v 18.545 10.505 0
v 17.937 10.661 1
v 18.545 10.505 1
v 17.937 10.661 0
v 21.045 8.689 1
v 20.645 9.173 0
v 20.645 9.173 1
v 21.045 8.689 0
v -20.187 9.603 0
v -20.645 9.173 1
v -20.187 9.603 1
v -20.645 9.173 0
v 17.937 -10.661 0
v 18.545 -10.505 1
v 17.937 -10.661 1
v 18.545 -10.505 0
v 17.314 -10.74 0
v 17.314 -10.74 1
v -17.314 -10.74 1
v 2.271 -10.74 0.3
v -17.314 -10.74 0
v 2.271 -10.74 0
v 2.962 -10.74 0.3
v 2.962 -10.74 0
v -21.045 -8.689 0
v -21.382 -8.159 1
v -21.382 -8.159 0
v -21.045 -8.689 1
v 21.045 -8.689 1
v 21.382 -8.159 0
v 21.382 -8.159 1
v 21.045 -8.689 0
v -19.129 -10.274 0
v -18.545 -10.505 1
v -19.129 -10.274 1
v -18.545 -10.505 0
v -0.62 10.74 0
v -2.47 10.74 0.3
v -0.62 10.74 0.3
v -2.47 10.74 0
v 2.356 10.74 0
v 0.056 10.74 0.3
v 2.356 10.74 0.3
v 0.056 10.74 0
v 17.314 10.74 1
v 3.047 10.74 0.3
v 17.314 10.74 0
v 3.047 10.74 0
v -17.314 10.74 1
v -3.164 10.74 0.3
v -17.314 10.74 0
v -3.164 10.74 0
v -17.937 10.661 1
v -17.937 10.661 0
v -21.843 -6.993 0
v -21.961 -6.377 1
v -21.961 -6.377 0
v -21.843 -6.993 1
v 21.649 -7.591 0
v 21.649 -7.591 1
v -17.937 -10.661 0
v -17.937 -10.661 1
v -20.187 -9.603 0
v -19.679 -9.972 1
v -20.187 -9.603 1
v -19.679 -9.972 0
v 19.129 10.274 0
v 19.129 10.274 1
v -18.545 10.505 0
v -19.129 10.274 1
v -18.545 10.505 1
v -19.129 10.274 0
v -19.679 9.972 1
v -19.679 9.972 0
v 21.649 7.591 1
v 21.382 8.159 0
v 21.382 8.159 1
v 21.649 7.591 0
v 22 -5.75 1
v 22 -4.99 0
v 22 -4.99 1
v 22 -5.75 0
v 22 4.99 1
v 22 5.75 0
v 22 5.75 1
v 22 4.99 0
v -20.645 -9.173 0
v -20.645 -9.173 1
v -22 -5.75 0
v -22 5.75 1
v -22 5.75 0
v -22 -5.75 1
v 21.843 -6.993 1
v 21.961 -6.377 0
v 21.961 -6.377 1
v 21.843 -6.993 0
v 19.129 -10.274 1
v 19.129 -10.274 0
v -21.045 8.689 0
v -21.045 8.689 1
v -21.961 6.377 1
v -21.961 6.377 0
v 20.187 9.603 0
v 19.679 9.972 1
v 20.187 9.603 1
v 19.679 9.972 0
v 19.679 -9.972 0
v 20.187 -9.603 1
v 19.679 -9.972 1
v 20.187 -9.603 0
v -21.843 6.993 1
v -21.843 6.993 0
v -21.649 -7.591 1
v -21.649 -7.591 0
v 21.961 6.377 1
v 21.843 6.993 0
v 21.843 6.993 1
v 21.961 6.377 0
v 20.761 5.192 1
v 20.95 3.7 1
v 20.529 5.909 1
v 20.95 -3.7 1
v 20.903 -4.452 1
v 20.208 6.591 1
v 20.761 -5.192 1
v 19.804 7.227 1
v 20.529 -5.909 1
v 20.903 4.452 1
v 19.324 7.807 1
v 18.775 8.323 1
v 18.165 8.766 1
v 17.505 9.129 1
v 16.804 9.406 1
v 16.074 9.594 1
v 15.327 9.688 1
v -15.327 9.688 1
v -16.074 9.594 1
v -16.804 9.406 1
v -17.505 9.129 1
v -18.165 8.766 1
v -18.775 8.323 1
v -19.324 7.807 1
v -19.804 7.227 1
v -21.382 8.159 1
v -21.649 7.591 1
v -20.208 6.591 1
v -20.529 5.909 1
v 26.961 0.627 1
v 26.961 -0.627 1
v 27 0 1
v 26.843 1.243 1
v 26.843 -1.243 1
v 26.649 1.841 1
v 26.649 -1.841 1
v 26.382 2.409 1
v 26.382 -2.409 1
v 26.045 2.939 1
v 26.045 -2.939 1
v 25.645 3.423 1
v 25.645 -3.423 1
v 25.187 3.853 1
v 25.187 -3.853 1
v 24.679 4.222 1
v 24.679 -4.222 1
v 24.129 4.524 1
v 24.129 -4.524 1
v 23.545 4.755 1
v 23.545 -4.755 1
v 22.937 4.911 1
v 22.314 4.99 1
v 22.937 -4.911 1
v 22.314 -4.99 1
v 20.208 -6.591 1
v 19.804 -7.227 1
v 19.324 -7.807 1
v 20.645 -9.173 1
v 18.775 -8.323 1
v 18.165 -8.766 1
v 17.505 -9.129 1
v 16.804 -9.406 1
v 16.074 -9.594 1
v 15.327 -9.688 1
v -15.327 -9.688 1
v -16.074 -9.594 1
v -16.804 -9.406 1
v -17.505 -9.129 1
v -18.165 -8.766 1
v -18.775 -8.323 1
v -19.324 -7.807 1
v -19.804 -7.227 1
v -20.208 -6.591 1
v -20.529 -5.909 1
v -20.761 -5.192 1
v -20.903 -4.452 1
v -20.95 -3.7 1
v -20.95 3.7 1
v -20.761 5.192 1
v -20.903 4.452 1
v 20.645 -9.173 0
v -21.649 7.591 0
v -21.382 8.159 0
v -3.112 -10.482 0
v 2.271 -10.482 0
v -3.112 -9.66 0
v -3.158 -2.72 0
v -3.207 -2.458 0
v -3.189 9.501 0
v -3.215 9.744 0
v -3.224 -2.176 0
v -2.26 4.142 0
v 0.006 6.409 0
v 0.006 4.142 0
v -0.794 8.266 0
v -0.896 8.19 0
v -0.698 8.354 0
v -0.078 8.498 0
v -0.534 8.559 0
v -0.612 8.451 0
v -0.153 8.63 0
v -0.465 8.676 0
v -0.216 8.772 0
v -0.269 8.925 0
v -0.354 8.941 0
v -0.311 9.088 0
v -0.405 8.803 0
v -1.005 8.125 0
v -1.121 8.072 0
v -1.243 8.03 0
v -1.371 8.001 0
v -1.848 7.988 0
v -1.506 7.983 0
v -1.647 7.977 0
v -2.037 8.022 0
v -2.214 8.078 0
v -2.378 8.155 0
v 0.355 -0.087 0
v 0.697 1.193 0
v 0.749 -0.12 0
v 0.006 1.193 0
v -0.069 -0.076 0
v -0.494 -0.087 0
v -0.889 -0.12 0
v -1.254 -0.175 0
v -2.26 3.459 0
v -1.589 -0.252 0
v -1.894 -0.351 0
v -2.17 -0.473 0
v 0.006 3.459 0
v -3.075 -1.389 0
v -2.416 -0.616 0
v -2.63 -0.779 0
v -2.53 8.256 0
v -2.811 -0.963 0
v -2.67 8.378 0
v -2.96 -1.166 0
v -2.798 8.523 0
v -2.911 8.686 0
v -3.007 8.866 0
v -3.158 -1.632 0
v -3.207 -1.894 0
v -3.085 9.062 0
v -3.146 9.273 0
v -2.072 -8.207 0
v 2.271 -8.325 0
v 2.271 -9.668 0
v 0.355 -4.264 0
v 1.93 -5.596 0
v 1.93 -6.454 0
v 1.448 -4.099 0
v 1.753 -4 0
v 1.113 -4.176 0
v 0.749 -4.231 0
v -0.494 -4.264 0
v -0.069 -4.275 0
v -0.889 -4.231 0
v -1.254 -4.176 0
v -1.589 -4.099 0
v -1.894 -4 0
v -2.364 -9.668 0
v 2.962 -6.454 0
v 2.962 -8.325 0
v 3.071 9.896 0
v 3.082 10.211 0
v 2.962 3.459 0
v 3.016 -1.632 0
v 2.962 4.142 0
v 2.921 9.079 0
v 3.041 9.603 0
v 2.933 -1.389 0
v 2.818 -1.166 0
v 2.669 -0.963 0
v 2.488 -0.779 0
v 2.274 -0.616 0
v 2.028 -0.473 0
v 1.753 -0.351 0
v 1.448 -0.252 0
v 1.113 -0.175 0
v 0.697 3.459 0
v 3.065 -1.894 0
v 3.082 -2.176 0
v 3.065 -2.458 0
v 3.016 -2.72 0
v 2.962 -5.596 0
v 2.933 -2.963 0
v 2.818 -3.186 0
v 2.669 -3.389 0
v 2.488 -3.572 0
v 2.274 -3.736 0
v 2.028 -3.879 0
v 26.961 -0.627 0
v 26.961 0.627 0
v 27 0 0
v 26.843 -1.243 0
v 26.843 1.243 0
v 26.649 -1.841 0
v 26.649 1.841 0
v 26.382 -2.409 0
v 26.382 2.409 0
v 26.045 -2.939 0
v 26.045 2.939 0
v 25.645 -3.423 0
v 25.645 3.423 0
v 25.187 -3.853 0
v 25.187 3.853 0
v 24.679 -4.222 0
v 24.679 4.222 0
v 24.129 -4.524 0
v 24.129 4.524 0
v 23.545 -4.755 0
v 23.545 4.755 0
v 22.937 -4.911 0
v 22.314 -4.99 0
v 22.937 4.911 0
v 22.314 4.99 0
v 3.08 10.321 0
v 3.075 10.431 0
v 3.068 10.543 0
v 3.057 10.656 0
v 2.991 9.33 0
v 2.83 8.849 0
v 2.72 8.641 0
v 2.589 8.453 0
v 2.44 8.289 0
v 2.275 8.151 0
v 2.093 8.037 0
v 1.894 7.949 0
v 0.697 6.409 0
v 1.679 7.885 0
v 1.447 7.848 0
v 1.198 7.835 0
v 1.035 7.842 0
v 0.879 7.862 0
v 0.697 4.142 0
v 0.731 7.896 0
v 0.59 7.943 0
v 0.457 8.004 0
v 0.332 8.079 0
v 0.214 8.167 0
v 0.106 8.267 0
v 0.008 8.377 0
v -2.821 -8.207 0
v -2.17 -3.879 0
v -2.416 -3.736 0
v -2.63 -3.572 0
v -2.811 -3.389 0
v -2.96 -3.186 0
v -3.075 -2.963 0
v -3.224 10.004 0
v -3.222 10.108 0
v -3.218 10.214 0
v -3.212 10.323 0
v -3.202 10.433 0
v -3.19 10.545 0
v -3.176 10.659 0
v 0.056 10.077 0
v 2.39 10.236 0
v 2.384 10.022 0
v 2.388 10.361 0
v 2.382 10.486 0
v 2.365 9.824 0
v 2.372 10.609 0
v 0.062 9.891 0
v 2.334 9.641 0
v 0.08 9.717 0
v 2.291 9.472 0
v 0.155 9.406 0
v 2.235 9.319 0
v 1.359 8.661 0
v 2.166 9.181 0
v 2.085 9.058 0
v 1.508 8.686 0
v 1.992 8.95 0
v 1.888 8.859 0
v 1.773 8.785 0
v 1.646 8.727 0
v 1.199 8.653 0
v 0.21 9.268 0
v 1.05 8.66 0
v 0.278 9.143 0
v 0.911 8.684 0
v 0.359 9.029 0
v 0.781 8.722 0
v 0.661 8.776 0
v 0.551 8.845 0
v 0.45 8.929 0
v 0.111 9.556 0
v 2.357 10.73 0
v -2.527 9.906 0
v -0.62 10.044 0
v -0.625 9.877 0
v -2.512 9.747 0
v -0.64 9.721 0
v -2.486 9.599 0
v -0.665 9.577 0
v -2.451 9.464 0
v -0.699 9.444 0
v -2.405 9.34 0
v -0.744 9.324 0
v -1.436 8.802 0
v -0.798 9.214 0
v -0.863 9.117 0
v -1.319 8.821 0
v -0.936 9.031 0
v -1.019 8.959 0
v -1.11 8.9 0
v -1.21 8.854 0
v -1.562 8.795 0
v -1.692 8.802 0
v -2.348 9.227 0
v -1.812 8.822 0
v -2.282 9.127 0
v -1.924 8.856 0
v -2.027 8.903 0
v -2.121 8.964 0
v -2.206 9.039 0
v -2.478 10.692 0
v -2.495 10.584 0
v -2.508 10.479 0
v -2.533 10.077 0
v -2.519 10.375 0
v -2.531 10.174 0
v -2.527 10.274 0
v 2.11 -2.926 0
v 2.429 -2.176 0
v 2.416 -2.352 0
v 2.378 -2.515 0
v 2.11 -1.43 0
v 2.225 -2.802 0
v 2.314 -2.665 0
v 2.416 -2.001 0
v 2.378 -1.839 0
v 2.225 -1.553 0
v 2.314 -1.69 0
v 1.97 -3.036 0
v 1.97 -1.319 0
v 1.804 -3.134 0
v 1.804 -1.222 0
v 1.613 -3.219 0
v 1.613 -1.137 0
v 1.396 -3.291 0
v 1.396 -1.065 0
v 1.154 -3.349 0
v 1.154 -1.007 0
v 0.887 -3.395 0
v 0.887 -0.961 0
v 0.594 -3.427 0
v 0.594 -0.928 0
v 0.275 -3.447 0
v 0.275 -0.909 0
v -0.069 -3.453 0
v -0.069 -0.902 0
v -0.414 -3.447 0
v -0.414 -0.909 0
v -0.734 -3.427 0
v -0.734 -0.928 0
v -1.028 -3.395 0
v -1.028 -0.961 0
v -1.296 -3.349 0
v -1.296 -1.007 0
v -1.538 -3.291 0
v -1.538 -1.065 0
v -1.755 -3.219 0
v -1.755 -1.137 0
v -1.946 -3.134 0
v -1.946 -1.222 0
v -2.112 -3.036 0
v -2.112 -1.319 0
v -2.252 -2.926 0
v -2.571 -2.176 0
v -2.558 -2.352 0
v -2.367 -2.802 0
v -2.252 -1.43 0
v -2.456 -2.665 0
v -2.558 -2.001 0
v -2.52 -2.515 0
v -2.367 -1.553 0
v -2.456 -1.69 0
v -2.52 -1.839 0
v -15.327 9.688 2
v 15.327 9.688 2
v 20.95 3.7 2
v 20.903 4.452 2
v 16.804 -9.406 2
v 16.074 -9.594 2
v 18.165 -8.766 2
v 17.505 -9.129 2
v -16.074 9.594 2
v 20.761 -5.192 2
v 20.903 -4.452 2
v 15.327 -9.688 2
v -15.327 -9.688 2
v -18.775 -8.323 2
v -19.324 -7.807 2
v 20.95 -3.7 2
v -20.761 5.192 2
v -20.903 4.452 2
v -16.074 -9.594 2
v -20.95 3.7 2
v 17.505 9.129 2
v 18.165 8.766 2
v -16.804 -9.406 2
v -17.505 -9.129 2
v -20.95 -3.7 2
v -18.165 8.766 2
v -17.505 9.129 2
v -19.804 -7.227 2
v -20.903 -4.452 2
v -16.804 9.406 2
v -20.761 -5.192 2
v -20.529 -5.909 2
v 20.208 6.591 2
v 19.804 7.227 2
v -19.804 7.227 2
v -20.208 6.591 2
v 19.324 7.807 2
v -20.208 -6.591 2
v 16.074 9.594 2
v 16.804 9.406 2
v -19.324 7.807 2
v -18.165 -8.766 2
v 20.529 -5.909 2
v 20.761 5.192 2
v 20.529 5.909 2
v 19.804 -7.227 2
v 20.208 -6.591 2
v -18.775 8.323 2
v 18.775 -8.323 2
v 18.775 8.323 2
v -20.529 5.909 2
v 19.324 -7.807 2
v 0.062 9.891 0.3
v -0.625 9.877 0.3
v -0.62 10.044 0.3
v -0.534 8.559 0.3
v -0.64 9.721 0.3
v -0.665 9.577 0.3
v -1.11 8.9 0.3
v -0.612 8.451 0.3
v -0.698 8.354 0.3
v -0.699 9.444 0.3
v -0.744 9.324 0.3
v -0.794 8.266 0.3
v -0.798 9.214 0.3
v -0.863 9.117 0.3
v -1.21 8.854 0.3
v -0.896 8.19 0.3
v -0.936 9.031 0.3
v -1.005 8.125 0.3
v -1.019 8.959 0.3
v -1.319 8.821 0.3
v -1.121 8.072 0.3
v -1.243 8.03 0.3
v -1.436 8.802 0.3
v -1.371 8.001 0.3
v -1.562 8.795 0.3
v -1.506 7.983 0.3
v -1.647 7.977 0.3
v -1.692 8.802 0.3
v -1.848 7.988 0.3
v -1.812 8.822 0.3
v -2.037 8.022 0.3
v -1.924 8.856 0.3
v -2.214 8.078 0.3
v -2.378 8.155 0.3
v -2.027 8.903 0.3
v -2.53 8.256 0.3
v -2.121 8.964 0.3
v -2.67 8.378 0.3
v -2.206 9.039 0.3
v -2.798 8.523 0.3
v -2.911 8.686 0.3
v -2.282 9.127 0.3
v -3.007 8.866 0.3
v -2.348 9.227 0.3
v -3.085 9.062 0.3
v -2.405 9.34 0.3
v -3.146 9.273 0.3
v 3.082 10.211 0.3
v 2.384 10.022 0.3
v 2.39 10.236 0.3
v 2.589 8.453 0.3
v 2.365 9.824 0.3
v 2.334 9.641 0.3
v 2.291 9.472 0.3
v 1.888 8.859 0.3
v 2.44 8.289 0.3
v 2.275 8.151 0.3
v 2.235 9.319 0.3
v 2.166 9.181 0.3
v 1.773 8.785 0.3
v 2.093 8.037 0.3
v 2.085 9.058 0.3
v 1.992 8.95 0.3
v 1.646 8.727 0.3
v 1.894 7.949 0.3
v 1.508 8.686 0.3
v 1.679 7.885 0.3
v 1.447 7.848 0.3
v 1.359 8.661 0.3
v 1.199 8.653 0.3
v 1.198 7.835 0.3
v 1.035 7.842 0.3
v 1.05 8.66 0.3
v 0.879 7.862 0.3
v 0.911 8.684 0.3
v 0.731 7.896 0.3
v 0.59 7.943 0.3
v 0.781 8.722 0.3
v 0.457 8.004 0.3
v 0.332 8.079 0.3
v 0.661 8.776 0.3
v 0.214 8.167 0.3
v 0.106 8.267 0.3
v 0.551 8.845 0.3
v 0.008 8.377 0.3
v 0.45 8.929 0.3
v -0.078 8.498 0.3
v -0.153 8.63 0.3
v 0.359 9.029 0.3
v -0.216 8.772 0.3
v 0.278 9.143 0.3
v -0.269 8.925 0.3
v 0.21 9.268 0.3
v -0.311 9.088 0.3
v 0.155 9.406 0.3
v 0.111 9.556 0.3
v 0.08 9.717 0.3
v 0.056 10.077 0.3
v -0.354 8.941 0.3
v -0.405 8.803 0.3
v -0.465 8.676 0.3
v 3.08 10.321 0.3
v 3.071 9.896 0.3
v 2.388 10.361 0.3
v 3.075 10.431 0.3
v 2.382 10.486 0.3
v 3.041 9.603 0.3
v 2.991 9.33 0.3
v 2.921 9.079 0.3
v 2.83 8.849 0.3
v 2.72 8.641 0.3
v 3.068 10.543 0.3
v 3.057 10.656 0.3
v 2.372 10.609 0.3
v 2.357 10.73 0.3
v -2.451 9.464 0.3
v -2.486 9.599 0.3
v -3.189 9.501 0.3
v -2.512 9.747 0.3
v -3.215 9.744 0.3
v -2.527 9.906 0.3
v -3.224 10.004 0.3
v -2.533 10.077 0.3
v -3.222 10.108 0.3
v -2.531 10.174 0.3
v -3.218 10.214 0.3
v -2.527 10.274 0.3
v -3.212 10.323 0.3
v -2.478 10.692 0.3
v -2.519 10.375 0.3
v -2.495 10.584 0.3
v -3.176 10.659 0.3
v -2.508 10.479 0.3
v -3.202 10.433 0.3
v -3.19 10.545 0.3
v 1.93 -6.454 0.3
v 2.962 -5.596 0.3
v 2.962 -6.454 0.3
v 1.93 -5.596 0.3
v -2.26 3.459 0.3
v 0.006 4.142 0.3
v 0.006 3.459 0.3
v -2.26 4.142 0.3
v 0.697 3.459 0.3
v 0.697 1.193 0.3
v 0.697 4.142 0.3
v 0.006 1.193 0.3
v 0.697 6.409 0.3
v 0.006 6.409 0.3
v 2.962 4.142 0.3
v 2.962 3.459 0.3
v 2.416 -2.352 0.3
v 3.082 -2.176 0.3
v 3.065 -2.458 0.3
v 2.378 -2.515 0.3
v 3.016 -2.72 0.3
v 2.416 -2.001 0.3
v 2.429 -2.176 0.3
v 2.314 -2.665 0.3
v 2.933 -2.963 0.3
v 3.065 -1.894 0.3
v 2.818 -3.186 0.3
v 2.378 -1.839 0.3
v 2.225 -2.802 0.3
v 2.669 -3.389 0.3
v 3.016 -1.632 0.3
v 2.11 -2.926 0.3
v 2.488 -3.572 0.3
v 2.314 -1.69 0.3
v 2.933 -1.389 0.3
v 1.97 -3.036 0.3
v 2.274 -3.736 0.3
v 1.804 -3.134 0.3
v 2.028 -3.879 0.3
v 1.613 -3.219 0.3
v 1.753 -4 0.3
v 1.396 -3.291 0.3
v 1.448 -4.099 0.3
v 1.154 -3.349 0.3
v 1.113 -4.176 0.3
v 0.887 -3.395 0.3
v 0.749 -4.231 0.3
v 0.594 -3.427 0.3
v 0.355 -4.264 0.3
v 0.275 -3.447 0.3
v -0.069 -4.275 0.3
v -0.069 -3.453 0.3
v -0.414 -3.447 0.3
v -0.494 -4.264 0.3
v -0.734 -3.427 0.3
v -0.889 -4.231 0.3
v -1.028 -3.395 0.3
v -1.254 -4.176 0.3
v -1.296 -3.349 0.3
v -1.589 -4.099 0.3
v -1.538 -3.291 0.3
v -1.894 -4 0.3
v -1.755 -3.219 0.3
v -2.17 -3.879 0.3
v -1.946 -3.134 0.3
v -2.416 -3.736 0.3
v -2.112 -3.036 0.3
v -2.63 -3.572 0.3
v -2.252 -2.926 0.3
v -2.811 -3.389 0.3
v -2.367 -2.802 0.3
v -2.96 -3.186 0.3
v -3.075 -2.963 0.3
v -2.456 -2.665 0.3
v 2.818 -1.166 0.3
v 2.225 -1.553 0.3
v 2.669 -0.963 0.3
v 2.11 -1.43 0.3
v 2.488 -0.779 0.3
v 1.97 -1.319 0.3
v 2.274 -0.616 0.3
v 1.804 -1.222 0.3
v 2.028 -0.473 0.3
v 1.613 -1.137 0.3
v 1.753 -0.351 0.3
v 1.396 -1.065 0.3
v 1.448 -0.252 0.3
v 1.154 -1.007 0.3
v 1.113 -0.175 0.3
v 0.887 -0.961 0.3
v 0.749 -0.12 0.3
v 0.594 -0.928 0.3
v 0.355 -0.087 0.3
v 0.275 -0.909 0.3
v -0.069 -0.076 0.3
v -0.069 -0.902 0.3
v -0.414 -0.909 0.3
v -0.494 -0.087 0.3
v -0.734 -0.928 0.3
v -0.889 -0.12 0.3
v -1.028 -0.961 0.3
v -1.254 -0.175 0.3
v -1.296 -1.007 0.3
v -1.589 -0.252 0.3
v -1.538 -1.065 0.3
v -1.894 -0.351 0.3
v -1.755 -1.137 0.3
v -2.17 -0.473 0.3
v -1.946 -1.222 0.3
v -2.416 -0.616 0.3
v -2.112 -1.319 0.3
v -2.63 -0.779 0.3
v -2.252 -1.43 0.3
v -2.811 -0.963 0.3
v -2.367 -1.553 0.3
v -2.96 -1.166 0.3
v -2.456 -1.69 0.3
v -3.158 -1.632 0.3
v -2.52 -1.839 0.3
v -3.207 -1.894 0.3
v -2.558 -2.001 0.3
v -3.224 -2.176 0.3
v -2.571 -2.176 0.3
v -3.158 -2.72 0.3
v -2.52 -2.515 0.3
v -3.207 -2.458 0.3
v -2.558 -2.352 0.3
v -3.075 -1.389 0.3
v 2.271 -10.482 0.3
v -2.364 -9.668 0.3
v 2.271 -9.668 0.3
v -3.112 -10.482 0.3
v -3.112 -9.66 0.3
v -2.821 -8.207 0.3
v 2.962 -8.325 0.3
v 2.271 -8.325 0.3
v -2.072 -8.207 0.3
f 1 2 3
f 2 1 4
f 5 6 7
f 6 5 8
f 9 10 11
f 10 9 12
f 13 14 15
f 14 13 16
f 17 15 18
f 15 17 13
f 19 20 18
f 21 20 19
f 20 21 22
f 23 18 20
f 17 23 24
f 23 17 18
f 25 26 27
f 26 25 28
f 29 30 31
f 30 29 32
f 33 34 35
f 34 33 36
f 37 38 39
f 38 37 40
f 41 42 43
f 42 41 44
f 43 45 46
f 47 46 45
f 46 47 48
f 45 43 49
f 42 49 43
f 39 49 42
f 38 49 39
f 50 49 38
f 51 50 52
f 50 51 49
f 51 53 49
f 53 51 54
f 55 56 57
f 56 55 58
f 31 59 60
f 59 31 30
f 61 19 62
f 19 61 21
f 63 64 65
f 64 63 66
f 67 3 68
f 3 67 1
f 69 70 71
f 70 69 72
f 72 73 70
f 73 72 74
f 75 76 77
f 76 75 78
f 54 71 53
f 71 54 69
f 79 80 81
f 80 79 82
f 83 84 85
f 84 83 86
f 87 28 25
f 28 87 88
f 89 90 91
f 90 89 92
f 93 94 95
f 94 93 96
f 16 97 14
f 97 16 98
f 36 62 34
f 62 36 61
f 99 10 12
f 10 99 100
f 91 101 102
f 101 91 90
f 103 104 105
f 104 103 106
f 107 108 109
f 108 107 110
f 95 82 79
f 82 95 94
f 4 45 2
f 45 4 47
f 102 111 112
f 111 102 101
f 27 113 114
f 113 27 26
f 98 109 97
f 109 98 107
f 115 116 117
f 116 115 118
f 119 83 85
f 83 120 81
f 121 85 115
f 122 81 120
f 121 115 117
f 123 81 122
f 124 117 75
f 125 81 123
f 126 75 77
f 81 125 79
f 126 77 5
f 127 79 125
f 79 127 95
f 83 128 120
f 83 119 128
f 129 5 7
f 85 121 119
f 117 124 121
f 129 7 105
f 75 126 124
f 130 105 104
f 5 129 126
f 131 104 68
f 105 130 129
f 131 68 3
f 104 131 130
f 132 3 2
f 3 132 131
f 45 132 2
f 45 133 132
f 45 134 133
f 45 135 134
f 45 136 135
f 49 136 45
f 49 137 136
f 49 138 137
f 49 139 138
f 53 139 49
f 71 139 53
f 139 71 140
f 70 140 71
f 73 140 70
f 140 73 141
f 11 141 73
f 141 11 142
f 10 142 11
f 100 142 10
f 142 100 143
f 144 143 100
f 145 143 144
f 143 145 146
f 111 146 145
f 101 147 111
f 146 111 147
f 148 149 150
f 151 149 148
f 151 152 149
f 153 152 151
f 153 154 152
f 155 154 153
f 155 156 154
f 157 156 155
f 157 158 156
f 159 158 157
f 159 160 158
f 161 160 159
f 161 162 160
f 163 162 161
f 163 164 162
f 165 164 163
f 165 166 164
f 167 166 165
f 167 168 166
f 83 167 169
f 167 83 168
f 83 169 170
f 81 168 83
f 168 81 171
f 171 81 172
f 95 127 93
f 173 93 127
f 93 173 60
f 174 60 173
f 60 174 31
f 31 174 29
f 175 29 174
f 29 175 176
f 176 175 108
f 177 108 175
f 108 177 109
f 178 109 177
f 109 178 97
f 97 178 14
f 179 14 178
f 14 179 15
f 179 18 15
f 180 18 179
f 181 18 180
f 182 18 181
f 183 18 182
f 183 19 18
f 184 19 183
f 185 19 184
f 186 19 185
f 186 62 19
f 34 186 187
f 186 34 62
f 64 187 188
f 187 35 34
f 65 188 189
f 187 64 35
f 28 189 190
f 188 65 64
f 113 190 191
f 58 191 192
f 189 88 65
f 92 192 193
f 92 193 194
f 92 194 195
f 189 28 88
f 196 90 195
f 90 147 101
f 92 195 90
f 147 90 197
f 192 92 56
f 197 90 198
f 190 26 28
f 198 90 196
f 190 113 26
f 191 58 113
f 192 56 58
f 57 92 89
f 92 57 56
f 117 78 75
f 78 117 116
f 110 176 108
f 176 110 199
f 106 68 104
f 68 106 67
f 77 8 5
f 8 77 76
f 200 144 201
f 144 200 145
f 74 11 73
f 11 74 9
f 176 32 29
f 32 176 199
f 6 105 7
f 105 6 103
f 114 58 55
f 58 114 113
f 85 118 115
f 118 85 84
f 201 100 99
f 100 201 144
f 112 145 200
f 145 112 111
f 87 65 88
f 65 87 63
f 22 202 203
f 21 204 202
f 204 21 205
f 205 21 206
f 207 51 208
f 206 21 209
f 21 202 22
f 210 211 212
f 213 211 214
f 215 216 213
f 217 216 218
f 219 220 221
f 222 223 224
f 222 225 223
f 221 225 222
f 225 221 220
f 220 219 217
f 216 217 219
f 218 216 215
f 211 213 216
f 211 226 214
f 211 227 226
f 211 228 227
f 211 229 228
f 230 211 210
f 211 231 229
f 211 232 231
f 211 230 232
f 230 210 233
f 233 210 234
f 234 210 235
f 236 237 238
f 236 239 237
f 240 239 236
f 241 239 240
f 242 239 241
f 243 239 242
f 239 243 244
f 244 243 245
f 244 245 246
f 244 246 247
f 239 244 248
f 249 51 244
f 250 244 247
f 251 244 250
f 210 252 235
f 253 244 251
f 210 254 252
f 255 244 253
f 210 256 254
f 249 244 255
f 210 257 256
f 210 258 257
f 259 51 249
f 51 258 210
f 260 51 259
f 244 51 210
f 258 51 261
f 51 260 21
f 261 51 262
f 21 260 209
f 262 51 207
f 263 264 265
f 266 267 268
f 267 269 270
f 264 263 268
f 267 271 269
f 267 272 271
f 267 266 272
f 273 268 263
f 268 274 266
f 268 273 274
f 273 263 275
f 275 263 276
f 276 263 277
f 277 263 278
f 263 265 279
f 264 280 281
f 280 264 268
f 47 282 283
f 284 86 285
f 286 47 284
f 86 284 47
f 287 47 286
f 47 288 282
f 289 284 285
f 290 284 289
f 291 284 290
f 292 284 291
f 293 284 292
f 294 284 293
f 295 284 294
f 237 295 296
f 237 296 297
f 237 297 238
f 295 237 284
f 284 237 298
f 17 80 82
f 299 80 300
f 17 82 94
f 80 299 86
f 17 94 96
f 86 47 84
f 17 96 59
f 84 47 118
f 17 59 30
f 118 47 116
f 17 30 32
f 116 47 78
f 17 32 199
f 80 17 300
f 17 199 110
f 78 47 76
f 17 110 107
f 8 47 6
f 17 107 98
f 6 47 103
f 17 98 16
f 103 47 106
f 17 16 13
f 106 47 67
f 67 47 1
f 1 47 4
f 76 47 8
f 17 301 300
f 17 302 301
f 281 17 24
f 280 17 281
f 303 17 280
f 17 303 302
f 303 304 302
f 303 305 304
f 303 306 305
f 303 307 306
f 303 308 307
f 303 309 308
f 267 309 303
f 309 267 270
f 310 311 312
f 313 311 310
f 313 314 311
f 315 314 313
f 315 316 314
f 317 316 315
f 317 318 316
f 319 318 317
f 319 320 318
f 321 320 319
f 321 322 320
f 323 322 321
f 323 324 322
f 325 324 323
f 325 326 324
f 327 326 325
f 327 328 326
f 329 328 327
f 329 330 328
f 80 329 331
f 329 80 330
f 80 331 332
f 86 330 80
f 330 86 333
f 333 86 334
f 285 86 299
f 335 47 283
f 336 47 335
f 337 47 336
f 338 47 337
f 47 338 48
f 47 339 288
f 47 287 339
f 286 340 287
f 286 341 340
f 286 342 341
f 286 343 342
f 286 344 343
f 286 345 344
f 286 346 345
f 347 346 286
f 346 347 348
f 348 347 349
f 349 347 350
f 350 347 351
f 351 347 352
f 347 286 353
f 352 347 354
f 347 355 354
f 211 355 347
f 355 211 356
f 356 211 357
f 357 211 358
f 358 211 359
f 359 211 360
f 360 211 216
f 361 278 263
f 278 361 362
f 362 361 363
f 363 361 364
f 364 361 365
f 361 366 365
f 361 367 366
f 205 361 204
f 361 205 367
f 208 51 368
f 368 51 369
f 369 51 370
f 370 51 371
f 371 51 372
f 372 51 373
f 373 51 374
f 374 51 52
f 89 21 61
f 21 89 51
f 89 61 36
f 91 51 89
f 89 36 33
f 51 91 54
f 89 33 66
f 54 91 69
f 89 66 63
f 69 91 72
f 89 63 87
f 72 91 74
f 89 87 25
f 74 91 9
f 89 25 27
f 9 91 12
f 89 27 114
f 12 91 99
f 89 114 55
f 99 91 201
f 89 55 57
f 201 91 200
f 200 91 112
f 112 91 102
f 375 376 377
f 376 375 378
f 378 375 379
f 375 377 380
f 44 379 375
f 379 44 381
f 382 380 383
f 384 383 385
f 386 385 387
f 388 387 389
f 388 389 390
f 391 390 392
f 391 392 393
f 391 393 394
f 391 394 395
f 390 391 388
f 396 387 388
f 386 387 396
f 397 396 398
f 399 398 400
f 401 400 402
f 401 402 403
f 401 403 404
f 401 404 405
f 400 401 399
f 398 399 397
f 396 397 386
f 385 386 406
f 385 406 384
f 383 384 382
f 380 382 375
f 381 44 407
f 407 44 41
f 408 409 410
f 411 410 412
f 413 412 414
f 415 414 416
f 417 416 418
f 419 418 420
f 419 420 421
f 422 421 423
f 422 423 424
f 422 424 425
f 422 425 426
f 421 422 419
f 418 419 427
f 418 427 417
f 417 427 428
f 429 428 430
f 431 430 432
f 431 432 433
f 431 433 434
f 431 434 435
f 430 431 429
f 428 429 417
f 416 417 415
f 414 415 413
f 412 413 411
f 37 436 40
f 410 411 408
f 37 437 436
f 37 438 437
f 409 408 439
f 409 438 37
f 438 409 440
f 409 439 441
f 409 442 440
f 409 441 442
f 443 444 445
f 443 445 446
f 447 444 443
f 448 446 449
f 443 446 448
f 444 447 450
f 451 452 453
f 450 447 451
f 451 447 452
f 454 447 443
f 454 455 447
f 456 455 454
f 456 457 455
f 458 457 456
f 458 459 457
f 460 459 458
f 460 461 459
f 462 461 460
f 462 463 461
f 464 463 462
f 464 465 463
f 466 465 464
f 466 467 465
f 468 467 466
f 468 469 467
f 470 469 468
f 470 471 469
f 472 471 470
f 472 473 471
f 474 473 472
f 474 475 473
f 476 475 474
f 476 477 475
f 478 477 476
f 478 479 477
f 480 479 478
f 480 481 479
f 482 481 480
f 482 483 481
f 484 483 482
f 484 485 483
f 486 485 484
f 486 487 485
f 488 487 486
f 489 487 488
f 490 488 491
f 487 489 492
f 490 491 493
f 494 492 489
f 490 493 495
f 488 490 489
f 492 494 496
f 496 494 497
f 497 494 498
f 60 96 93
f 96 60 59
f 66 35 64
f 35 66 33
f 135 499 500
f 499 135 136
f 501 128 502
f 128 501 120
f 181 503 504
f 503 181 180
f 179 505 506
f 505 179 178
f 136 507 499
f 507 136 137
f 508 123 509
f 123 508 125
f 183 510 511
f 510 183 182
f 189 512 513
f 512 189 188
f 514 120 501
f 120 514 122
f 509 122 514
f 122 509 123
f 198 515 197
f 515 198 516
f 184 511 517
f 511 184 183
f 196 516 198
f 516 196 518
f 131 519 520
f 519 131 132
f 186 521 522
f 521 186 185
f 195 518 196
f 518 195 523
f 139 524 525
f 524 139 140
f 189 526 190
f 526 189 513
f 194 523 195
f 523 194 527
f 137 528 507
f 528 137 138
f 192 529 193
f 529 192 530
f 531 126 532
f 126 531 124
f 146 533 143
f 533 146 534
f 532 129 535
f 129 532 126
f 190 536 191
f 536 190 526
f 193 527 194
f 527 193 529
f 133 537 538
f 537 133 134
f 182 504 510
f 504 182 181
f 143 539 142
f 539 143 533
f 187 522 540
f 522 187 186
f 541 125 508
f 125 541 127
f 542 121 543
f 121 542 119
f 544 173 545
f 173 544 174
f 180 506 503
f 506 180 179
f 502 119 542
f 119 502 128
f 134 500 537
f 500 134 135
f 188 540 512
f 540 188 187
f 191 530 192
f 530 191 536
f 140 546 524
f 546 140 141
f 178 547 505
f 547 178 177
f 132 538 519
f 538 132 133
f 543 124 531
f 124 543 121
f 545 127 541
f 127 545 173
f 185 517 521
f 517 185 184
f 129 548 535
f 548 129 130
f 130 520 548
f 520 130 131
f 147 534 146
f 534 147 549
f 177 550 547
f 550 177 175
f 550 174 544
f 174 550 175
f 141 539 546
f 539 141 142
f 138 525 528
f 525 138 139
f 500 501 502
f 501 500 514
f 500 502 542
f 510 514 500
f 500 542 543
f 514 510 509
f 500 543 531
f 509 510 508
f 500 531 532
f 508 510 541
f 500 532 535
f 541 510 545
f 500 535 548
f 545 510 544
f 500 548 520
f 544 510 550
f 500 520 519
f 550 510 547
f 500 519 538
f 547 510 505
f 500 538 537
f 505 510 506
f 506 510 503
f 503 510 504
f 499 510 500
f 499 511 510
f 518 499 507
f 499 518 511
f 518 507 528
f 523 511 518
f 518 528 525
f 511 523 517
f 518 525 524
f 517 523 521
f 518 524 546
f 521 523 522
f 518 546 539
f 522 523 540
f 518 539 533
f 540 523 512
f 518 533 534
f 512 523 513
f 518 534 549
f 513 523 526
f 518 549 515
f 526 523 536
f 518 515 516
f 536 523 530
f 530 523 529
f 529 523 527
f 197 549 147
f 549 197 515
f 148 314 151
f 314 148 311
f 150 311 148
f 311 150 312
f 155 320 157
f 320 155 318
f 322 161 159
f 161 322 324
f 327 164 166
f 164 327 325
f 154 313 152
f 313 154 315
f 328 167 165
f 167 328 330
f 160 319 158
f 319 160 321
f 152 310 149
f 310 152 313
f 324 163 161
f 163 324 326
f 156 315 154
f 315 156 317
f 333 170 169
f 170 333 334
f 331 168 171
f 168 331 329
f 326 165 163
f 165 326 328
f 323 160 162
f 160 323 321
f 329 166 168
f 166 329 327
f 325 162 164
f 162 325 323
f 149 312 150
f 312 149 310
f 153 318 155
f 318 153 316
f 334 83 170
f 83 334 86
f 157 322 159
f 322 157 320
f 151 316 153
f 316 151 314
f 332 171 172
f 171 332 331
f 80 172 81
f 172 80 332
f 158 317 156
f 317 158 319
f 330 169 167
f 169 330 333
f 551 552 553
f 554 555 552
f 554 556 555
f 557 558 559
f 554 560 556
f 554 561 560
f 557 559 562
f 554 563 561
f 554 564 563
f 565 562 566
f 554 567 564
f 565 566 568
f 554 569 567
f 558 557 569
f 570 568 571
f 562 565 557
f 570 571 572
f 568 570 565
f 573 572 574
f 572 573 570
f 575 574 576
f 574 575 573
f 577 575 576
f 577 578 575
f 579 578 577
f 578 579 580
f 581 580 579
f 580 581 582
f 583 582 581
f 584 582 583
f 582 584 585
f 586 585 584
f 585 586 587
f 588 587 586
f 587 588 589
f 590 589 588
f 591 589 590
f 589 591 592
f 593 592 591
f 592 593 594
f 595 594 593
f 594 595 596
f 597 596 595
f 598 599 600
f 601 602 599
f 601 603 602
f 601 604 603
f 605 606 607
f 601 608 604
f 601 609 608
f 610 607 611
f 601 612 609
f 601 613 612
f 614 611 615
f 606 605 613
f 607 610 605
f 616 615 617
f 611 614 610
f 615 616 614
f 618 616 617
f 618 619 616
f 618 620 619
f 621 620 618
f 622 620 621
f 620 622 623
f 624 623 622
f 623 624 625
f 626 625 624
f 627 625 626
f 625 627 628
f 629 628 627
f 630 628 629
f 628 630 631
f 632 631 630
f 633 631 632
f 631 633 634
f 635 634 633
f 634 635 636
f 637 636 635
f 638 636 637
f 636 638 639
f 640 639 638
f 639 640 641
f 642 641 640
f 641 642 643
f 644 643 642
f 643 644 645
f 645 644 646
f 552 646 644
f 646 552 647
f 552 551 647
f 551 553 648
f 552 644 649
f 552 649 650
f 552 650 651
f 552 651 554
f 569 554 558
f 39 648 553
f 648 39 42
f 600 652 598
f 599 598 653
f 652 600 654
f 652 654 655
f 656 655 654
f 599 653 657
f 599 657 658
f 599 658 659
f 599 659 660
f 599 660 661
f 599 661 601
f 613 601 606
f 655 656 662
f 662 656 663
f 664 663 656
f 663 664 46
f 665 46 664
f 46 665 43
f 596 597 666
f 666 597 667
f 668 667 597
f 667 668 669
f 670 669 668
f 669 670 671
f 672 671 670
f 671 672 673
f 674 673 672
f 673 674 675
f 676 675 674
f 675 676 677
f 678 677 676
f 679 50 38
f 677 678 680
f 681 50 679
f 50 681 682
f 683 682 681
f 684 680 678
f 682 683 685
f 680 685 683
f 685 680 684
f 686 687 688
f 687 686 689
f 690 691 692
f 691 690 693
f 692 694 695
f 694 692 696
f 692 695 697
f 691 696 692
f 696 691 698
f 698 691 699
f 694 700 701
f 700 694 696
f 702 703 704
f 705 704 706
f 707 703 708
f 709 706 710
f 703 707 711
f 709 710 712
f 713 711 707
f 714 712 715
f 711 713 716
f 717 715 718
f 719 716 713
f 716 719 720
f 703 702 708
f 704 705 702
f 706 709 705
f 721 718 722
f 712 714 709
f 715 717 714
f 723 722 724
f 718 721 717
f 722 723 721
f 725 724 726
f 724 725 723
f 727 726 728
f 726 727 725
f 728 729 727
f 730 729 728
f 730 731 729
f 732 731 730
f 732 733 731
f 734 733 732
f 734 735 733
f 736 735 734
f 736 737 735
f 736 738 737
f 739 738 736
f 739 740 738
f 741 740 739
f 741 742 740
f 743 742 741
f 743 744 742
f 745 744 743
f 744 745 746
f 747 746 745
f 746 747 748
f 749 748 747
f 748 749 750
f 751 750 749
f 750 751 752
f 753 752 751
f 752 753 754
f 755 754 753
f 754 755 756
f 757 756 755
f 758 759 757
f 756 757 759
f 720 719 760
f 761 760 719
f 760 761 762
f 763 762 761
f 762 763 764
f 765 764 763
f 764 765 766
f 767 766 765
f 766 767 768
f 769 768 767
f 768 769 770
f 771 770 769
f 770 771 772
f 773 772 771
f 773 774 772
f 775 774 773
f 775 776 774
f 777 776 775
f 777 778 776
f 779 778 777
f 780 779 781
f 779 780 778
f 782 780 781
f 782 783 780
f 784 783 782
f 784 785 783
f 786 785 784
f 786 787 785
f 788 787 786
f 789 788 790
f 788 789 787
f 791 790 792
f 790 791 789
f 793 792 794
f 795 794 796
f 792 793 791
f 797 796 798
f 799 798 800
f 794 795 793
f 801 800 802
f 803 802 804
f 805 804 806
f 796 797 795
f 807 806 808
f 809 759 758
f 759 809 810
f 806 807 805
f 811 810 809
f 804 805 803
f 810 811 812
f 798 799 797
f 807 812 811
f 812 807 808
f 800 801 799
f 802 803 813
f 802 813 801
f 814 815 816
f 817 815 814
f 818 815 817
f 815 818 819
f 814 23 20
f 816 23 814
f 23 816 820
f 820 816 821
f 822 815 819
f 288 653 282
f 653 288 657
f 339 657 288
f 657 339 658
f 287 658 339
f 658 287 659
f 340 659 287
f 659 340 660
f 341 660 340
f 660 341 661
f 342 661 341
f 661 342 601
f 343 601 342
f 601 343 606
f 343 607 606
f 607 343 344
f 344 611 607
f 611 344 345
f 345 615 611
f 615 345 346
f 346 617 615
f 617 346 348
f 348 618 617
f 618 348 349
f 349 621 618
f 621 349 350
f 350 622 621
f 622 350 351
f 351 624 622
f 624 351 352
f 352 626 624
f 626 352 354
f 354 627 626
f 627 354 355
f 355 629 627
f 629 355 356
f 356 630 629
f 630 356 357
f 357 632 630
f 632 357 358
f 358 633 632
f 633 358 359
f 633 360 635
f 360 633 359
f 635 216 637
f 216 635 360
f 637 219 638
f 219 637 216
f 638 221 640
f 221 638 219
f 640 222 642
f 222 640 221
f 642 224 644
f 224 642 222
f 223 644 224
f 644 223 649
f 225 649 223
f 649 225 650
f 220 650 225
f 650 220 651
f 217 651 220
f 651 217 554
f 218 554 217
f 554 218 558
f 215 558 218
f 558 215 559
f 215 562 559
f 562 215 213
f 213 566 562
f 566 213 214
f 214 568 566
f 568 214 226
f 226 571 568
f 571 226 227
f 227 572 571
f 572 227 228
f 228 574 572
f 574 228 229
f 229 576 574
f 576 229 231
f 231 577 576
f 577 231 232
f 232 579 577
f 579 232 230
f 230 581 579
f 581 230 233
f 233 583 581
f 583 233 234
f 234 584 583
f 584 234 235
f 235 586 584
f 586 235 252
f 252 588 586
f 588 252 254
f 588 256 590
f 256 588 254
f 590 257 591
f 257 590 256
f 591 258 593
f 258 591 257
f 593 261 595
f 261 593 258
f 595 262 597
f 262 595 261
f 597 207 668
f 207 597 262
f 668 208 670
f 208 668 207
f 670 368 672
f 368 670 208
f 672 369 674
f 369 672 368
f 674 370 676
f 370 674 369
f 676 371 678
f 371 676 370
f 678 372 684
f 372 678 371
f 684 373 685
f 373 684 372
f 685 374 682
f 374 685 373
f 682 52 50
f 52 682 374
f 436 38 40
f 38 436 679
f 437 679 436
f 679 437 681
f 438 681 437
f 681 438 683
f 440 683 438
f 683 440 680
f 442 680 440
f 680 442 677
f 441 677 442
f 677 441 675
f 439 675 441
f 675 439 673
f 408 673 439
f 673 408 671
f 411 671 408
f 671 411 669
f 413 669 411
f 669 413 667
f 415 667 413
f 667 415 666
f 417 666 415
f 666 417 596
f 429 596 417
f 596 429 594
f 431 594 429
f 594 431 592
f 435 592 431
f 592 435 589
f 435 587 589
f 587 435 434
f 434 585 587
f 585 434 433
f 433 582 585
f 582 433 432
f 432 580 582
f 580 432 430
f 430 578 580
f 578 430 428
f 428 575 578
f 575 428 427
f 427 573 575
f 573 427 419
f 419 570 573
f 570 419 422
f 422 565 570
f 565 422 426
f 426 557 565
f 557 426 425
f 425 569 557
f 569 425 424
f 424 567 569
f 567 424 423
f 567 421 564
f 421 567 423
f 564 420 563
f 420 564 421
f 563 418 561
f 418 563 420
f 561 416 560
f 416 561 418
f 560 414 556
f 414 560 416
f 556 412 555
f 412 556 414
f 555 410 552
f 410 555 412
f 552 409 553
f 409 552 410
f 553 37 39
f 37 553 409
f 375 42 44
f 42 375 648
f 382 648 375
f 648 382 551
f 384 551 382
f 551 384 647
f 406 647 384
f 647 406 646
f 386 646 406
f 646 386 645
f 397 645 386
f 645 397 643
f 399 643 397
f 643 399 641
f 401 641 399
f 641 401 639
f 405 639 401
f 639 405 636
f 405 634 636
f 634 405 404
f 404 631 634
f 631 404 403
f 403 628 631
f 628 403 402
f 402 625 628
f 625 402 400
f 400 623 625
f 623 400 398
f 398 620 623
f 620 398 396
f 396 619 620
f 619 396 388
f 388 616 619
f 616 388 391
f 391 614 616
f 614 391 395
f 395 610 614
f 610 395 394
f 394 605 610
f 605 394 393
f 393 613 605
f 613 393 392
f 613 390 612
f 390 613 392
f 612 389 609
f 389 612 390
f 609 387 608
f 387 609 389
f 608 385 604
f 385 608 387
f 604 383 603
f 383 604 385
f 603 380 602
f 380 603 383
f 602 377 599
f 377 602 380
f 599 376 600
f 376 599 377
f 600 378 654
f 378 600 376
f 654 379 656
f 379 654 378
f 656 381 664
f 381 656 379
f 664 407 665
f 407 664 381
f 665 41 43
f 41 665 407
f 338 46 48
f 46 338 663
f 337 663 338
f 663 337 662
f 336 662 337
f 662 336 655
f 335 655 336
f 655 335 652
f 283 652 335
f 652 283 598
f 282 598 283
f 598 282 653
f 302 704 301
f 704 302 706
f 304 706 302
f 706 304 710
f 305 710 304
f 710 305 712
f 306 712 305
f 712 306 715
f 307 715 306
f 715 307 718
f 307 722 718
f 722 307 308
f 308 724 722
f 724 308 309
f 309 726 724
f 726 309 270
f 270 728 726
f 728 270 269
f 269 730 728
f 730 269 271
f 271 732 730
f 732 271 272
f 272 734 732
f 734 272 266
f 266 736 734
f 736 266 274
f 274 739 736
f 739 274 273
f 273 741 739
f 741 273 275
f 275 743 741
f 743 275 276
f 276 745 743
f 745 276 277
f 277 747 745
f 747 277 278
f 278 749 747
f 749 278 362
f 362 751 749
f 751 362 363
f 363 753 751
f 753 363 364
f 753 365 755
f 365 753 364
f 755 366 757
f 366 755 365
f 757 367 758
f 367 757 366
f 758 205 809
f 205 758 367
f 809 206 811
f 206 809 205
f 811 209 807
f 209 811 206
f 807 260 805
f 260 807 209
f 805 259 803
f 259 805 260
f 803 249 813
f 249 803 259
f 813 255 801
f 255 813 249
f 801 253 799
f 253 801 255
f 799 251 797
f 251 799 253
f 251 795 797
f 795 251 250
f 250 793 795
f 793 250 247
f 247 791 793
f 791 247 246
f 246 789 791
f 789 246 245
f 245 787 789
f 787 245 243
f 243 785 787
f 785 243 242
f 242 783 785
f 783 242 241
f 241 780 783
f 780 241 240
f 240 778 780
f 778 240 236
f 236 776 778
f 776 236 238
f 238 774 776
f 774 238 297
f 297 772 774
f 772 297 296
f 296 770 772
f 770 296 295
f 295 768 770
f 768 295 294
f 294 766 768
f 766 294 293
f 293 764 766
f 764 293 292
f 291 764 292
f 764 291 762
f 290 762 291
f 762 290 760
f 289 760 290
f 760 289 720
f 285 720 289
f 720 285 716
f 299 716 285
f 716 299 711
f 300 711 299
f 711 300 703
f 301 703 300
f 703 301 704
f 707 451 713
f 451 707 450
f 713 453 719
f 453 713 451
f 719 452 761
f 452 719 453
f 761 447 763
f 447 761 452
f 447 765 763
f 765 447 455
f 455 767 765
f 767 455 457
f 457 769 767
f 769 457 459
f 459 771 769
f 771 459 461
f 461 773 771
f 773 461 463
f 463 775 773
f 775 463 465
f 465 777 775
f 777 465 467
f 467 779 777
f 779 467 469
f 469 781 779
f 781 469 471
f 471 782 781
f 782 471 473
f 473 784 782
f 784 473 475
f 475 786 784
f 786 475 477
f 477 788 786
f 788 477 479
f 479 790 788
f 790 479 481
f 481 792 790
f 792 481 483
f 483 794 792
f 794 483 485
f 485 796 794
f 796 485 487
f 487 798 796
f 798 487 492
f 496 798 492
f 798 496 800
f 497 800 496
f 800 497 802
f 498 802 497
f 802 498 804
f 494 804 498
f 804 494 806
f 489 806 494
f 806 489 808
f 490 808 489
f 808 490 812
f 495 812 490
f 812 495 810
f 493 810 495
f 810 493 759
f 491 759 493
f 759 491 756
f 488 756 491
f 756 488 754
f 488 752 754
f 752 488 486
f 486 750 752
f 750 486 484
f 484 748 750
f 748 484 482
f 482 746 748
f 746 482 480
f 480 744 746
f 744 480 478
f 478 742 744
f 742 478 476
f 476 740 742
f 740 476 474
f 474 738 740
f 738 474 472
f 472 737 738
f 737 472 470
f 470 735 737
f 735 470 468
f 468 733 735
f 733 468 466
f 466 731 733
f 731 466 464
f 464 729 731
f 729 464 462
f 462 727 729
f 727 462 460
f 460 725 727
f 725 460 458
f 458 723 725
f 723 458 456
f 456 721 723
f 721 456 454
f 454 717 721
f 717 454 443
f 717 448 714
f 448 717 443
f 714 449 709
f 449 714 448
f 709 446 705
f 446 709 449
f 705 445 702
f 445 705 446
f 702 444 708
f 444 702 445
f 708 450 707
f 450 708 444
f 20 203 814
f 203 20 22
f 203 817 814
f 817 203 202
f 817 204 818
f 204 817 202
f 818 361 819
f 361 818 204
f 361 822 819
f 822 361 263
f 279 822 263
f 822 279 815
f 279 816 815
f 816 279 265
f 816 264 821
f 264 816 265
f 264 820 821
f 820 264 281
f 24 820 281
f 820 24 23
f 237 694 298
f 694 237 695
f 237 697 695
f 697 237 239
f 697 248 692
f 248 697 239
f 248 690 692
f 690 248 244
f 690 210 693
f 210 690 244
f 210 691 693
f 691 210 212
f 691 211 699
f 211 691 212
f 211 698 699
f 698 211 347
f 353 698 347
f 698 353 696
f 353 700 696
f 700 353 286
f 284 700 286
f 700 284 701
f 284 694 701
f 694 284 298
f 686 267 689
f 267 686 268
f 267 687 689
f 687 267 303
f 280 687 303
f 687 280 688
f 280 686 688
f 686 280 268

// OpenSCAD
$fn = 50;


difference() {
	union() {
		translate(v = [0, 0, 0]) {
			rotate(a = [0, 0, 0]) {
				hull() {
					translate(v = [-17.0000000000, 5.7500000000, 0]) {
						rotate(a = [0, 0, 0]) {
							translate(v = [0, 0, 0]) {
								rotate(a = [0, 0, 0]) {
									cylinder(h = 1, r = 5);
								}
							}
						}
					}
					translate(v = [17.0000000000, 5.7500000000, 0]) {
						rotate(a = [0, 0, 0]) {
							translate(v = [0, 0, 0]) {
								rotate(a = [0, 0, 0]) {
									cylinder(h = 1, r = 5);
								}
							}
						}
					}
					translate(v = [-17.0000000000, -5.7500000000, 0]) {
						rotate(a = [0, 0, 0]) {
							translate(v = [0, 0, 0]) {
								rotate(a = [0, 0, 0]) {
									cylinder(h = 1, r = 5);
								}
							}
						}
					}
					translate(v = [17.0000000000, -5.7500000000, 0]) {
						rotate(a = [0, 0, 0]) {
							translate(v = [0, 0, 0]) {
								rotate(a = [0, 0, 0]) {
									cylinder(h = 1, r = 5);
								}
							}
						}
					}
				}
			}
		}
		translate(v = [0, 0, 0]) {
			rotate(a = [0, 0, 0]) {
				hull() {
					translate(v = [-14.9500000000, 3.7000000000, 0]) {
						rotate(a = [0, 0, 0]) {
							translate(v = [0, 0, 0]) {
								rotate(a = [0, 0, 0]) {
									cylinder(h = 2, r = 6);
								}
							}
						}
					}
					translate(v = [14.9500000000, 3.7000000000, 0]) {
						rotate(a = [0, 0, 0]) {
							translate(v = [0, 0, 0]) {
								rotate(a = [0, 0, 0]) {
									cylinder(h = 2, r = 6);
								}
							}
						}
					}
					translate(v = [-14.9500000000, -3.7000000000, 0]) {
						rotate(a = [0, 0, 0]) {
							translate(v = [0, 0, 0]) {
								rotate(a = [0, 0, 0]) {
									cylinder(h = 2, r = 6);
								}
							}
						}
					}
					translate(v = [14.9500000000, -3.7000000000, 0]) {
						rotate(a = [0, 0, 0]) {
							translate(v = [0, 0, 0]) {
								rotate(a = [0, 0, 0]) {
									cylinder(h = 2, r = 6);
								}
							}
						}
					}
				}
			}
		}
		translate(v = [22.0000000000, 0, 0.0000000000]) {
			rotate(a = [0, 0, 0]) {
				cylinder(h = 1, r = 5);
			}
		}
	}
	union() {
		translate(v = [0, 0, 0.3000000000]) {
			rotate(a = [0, 180, 90]) {
				linear_extrude(height = 0.3000000000) {
					text(font = "Candara:Light", halign = "center", size = 6, text = "3+0.1", valign = "center");
				}
			}
		}
	}
}
